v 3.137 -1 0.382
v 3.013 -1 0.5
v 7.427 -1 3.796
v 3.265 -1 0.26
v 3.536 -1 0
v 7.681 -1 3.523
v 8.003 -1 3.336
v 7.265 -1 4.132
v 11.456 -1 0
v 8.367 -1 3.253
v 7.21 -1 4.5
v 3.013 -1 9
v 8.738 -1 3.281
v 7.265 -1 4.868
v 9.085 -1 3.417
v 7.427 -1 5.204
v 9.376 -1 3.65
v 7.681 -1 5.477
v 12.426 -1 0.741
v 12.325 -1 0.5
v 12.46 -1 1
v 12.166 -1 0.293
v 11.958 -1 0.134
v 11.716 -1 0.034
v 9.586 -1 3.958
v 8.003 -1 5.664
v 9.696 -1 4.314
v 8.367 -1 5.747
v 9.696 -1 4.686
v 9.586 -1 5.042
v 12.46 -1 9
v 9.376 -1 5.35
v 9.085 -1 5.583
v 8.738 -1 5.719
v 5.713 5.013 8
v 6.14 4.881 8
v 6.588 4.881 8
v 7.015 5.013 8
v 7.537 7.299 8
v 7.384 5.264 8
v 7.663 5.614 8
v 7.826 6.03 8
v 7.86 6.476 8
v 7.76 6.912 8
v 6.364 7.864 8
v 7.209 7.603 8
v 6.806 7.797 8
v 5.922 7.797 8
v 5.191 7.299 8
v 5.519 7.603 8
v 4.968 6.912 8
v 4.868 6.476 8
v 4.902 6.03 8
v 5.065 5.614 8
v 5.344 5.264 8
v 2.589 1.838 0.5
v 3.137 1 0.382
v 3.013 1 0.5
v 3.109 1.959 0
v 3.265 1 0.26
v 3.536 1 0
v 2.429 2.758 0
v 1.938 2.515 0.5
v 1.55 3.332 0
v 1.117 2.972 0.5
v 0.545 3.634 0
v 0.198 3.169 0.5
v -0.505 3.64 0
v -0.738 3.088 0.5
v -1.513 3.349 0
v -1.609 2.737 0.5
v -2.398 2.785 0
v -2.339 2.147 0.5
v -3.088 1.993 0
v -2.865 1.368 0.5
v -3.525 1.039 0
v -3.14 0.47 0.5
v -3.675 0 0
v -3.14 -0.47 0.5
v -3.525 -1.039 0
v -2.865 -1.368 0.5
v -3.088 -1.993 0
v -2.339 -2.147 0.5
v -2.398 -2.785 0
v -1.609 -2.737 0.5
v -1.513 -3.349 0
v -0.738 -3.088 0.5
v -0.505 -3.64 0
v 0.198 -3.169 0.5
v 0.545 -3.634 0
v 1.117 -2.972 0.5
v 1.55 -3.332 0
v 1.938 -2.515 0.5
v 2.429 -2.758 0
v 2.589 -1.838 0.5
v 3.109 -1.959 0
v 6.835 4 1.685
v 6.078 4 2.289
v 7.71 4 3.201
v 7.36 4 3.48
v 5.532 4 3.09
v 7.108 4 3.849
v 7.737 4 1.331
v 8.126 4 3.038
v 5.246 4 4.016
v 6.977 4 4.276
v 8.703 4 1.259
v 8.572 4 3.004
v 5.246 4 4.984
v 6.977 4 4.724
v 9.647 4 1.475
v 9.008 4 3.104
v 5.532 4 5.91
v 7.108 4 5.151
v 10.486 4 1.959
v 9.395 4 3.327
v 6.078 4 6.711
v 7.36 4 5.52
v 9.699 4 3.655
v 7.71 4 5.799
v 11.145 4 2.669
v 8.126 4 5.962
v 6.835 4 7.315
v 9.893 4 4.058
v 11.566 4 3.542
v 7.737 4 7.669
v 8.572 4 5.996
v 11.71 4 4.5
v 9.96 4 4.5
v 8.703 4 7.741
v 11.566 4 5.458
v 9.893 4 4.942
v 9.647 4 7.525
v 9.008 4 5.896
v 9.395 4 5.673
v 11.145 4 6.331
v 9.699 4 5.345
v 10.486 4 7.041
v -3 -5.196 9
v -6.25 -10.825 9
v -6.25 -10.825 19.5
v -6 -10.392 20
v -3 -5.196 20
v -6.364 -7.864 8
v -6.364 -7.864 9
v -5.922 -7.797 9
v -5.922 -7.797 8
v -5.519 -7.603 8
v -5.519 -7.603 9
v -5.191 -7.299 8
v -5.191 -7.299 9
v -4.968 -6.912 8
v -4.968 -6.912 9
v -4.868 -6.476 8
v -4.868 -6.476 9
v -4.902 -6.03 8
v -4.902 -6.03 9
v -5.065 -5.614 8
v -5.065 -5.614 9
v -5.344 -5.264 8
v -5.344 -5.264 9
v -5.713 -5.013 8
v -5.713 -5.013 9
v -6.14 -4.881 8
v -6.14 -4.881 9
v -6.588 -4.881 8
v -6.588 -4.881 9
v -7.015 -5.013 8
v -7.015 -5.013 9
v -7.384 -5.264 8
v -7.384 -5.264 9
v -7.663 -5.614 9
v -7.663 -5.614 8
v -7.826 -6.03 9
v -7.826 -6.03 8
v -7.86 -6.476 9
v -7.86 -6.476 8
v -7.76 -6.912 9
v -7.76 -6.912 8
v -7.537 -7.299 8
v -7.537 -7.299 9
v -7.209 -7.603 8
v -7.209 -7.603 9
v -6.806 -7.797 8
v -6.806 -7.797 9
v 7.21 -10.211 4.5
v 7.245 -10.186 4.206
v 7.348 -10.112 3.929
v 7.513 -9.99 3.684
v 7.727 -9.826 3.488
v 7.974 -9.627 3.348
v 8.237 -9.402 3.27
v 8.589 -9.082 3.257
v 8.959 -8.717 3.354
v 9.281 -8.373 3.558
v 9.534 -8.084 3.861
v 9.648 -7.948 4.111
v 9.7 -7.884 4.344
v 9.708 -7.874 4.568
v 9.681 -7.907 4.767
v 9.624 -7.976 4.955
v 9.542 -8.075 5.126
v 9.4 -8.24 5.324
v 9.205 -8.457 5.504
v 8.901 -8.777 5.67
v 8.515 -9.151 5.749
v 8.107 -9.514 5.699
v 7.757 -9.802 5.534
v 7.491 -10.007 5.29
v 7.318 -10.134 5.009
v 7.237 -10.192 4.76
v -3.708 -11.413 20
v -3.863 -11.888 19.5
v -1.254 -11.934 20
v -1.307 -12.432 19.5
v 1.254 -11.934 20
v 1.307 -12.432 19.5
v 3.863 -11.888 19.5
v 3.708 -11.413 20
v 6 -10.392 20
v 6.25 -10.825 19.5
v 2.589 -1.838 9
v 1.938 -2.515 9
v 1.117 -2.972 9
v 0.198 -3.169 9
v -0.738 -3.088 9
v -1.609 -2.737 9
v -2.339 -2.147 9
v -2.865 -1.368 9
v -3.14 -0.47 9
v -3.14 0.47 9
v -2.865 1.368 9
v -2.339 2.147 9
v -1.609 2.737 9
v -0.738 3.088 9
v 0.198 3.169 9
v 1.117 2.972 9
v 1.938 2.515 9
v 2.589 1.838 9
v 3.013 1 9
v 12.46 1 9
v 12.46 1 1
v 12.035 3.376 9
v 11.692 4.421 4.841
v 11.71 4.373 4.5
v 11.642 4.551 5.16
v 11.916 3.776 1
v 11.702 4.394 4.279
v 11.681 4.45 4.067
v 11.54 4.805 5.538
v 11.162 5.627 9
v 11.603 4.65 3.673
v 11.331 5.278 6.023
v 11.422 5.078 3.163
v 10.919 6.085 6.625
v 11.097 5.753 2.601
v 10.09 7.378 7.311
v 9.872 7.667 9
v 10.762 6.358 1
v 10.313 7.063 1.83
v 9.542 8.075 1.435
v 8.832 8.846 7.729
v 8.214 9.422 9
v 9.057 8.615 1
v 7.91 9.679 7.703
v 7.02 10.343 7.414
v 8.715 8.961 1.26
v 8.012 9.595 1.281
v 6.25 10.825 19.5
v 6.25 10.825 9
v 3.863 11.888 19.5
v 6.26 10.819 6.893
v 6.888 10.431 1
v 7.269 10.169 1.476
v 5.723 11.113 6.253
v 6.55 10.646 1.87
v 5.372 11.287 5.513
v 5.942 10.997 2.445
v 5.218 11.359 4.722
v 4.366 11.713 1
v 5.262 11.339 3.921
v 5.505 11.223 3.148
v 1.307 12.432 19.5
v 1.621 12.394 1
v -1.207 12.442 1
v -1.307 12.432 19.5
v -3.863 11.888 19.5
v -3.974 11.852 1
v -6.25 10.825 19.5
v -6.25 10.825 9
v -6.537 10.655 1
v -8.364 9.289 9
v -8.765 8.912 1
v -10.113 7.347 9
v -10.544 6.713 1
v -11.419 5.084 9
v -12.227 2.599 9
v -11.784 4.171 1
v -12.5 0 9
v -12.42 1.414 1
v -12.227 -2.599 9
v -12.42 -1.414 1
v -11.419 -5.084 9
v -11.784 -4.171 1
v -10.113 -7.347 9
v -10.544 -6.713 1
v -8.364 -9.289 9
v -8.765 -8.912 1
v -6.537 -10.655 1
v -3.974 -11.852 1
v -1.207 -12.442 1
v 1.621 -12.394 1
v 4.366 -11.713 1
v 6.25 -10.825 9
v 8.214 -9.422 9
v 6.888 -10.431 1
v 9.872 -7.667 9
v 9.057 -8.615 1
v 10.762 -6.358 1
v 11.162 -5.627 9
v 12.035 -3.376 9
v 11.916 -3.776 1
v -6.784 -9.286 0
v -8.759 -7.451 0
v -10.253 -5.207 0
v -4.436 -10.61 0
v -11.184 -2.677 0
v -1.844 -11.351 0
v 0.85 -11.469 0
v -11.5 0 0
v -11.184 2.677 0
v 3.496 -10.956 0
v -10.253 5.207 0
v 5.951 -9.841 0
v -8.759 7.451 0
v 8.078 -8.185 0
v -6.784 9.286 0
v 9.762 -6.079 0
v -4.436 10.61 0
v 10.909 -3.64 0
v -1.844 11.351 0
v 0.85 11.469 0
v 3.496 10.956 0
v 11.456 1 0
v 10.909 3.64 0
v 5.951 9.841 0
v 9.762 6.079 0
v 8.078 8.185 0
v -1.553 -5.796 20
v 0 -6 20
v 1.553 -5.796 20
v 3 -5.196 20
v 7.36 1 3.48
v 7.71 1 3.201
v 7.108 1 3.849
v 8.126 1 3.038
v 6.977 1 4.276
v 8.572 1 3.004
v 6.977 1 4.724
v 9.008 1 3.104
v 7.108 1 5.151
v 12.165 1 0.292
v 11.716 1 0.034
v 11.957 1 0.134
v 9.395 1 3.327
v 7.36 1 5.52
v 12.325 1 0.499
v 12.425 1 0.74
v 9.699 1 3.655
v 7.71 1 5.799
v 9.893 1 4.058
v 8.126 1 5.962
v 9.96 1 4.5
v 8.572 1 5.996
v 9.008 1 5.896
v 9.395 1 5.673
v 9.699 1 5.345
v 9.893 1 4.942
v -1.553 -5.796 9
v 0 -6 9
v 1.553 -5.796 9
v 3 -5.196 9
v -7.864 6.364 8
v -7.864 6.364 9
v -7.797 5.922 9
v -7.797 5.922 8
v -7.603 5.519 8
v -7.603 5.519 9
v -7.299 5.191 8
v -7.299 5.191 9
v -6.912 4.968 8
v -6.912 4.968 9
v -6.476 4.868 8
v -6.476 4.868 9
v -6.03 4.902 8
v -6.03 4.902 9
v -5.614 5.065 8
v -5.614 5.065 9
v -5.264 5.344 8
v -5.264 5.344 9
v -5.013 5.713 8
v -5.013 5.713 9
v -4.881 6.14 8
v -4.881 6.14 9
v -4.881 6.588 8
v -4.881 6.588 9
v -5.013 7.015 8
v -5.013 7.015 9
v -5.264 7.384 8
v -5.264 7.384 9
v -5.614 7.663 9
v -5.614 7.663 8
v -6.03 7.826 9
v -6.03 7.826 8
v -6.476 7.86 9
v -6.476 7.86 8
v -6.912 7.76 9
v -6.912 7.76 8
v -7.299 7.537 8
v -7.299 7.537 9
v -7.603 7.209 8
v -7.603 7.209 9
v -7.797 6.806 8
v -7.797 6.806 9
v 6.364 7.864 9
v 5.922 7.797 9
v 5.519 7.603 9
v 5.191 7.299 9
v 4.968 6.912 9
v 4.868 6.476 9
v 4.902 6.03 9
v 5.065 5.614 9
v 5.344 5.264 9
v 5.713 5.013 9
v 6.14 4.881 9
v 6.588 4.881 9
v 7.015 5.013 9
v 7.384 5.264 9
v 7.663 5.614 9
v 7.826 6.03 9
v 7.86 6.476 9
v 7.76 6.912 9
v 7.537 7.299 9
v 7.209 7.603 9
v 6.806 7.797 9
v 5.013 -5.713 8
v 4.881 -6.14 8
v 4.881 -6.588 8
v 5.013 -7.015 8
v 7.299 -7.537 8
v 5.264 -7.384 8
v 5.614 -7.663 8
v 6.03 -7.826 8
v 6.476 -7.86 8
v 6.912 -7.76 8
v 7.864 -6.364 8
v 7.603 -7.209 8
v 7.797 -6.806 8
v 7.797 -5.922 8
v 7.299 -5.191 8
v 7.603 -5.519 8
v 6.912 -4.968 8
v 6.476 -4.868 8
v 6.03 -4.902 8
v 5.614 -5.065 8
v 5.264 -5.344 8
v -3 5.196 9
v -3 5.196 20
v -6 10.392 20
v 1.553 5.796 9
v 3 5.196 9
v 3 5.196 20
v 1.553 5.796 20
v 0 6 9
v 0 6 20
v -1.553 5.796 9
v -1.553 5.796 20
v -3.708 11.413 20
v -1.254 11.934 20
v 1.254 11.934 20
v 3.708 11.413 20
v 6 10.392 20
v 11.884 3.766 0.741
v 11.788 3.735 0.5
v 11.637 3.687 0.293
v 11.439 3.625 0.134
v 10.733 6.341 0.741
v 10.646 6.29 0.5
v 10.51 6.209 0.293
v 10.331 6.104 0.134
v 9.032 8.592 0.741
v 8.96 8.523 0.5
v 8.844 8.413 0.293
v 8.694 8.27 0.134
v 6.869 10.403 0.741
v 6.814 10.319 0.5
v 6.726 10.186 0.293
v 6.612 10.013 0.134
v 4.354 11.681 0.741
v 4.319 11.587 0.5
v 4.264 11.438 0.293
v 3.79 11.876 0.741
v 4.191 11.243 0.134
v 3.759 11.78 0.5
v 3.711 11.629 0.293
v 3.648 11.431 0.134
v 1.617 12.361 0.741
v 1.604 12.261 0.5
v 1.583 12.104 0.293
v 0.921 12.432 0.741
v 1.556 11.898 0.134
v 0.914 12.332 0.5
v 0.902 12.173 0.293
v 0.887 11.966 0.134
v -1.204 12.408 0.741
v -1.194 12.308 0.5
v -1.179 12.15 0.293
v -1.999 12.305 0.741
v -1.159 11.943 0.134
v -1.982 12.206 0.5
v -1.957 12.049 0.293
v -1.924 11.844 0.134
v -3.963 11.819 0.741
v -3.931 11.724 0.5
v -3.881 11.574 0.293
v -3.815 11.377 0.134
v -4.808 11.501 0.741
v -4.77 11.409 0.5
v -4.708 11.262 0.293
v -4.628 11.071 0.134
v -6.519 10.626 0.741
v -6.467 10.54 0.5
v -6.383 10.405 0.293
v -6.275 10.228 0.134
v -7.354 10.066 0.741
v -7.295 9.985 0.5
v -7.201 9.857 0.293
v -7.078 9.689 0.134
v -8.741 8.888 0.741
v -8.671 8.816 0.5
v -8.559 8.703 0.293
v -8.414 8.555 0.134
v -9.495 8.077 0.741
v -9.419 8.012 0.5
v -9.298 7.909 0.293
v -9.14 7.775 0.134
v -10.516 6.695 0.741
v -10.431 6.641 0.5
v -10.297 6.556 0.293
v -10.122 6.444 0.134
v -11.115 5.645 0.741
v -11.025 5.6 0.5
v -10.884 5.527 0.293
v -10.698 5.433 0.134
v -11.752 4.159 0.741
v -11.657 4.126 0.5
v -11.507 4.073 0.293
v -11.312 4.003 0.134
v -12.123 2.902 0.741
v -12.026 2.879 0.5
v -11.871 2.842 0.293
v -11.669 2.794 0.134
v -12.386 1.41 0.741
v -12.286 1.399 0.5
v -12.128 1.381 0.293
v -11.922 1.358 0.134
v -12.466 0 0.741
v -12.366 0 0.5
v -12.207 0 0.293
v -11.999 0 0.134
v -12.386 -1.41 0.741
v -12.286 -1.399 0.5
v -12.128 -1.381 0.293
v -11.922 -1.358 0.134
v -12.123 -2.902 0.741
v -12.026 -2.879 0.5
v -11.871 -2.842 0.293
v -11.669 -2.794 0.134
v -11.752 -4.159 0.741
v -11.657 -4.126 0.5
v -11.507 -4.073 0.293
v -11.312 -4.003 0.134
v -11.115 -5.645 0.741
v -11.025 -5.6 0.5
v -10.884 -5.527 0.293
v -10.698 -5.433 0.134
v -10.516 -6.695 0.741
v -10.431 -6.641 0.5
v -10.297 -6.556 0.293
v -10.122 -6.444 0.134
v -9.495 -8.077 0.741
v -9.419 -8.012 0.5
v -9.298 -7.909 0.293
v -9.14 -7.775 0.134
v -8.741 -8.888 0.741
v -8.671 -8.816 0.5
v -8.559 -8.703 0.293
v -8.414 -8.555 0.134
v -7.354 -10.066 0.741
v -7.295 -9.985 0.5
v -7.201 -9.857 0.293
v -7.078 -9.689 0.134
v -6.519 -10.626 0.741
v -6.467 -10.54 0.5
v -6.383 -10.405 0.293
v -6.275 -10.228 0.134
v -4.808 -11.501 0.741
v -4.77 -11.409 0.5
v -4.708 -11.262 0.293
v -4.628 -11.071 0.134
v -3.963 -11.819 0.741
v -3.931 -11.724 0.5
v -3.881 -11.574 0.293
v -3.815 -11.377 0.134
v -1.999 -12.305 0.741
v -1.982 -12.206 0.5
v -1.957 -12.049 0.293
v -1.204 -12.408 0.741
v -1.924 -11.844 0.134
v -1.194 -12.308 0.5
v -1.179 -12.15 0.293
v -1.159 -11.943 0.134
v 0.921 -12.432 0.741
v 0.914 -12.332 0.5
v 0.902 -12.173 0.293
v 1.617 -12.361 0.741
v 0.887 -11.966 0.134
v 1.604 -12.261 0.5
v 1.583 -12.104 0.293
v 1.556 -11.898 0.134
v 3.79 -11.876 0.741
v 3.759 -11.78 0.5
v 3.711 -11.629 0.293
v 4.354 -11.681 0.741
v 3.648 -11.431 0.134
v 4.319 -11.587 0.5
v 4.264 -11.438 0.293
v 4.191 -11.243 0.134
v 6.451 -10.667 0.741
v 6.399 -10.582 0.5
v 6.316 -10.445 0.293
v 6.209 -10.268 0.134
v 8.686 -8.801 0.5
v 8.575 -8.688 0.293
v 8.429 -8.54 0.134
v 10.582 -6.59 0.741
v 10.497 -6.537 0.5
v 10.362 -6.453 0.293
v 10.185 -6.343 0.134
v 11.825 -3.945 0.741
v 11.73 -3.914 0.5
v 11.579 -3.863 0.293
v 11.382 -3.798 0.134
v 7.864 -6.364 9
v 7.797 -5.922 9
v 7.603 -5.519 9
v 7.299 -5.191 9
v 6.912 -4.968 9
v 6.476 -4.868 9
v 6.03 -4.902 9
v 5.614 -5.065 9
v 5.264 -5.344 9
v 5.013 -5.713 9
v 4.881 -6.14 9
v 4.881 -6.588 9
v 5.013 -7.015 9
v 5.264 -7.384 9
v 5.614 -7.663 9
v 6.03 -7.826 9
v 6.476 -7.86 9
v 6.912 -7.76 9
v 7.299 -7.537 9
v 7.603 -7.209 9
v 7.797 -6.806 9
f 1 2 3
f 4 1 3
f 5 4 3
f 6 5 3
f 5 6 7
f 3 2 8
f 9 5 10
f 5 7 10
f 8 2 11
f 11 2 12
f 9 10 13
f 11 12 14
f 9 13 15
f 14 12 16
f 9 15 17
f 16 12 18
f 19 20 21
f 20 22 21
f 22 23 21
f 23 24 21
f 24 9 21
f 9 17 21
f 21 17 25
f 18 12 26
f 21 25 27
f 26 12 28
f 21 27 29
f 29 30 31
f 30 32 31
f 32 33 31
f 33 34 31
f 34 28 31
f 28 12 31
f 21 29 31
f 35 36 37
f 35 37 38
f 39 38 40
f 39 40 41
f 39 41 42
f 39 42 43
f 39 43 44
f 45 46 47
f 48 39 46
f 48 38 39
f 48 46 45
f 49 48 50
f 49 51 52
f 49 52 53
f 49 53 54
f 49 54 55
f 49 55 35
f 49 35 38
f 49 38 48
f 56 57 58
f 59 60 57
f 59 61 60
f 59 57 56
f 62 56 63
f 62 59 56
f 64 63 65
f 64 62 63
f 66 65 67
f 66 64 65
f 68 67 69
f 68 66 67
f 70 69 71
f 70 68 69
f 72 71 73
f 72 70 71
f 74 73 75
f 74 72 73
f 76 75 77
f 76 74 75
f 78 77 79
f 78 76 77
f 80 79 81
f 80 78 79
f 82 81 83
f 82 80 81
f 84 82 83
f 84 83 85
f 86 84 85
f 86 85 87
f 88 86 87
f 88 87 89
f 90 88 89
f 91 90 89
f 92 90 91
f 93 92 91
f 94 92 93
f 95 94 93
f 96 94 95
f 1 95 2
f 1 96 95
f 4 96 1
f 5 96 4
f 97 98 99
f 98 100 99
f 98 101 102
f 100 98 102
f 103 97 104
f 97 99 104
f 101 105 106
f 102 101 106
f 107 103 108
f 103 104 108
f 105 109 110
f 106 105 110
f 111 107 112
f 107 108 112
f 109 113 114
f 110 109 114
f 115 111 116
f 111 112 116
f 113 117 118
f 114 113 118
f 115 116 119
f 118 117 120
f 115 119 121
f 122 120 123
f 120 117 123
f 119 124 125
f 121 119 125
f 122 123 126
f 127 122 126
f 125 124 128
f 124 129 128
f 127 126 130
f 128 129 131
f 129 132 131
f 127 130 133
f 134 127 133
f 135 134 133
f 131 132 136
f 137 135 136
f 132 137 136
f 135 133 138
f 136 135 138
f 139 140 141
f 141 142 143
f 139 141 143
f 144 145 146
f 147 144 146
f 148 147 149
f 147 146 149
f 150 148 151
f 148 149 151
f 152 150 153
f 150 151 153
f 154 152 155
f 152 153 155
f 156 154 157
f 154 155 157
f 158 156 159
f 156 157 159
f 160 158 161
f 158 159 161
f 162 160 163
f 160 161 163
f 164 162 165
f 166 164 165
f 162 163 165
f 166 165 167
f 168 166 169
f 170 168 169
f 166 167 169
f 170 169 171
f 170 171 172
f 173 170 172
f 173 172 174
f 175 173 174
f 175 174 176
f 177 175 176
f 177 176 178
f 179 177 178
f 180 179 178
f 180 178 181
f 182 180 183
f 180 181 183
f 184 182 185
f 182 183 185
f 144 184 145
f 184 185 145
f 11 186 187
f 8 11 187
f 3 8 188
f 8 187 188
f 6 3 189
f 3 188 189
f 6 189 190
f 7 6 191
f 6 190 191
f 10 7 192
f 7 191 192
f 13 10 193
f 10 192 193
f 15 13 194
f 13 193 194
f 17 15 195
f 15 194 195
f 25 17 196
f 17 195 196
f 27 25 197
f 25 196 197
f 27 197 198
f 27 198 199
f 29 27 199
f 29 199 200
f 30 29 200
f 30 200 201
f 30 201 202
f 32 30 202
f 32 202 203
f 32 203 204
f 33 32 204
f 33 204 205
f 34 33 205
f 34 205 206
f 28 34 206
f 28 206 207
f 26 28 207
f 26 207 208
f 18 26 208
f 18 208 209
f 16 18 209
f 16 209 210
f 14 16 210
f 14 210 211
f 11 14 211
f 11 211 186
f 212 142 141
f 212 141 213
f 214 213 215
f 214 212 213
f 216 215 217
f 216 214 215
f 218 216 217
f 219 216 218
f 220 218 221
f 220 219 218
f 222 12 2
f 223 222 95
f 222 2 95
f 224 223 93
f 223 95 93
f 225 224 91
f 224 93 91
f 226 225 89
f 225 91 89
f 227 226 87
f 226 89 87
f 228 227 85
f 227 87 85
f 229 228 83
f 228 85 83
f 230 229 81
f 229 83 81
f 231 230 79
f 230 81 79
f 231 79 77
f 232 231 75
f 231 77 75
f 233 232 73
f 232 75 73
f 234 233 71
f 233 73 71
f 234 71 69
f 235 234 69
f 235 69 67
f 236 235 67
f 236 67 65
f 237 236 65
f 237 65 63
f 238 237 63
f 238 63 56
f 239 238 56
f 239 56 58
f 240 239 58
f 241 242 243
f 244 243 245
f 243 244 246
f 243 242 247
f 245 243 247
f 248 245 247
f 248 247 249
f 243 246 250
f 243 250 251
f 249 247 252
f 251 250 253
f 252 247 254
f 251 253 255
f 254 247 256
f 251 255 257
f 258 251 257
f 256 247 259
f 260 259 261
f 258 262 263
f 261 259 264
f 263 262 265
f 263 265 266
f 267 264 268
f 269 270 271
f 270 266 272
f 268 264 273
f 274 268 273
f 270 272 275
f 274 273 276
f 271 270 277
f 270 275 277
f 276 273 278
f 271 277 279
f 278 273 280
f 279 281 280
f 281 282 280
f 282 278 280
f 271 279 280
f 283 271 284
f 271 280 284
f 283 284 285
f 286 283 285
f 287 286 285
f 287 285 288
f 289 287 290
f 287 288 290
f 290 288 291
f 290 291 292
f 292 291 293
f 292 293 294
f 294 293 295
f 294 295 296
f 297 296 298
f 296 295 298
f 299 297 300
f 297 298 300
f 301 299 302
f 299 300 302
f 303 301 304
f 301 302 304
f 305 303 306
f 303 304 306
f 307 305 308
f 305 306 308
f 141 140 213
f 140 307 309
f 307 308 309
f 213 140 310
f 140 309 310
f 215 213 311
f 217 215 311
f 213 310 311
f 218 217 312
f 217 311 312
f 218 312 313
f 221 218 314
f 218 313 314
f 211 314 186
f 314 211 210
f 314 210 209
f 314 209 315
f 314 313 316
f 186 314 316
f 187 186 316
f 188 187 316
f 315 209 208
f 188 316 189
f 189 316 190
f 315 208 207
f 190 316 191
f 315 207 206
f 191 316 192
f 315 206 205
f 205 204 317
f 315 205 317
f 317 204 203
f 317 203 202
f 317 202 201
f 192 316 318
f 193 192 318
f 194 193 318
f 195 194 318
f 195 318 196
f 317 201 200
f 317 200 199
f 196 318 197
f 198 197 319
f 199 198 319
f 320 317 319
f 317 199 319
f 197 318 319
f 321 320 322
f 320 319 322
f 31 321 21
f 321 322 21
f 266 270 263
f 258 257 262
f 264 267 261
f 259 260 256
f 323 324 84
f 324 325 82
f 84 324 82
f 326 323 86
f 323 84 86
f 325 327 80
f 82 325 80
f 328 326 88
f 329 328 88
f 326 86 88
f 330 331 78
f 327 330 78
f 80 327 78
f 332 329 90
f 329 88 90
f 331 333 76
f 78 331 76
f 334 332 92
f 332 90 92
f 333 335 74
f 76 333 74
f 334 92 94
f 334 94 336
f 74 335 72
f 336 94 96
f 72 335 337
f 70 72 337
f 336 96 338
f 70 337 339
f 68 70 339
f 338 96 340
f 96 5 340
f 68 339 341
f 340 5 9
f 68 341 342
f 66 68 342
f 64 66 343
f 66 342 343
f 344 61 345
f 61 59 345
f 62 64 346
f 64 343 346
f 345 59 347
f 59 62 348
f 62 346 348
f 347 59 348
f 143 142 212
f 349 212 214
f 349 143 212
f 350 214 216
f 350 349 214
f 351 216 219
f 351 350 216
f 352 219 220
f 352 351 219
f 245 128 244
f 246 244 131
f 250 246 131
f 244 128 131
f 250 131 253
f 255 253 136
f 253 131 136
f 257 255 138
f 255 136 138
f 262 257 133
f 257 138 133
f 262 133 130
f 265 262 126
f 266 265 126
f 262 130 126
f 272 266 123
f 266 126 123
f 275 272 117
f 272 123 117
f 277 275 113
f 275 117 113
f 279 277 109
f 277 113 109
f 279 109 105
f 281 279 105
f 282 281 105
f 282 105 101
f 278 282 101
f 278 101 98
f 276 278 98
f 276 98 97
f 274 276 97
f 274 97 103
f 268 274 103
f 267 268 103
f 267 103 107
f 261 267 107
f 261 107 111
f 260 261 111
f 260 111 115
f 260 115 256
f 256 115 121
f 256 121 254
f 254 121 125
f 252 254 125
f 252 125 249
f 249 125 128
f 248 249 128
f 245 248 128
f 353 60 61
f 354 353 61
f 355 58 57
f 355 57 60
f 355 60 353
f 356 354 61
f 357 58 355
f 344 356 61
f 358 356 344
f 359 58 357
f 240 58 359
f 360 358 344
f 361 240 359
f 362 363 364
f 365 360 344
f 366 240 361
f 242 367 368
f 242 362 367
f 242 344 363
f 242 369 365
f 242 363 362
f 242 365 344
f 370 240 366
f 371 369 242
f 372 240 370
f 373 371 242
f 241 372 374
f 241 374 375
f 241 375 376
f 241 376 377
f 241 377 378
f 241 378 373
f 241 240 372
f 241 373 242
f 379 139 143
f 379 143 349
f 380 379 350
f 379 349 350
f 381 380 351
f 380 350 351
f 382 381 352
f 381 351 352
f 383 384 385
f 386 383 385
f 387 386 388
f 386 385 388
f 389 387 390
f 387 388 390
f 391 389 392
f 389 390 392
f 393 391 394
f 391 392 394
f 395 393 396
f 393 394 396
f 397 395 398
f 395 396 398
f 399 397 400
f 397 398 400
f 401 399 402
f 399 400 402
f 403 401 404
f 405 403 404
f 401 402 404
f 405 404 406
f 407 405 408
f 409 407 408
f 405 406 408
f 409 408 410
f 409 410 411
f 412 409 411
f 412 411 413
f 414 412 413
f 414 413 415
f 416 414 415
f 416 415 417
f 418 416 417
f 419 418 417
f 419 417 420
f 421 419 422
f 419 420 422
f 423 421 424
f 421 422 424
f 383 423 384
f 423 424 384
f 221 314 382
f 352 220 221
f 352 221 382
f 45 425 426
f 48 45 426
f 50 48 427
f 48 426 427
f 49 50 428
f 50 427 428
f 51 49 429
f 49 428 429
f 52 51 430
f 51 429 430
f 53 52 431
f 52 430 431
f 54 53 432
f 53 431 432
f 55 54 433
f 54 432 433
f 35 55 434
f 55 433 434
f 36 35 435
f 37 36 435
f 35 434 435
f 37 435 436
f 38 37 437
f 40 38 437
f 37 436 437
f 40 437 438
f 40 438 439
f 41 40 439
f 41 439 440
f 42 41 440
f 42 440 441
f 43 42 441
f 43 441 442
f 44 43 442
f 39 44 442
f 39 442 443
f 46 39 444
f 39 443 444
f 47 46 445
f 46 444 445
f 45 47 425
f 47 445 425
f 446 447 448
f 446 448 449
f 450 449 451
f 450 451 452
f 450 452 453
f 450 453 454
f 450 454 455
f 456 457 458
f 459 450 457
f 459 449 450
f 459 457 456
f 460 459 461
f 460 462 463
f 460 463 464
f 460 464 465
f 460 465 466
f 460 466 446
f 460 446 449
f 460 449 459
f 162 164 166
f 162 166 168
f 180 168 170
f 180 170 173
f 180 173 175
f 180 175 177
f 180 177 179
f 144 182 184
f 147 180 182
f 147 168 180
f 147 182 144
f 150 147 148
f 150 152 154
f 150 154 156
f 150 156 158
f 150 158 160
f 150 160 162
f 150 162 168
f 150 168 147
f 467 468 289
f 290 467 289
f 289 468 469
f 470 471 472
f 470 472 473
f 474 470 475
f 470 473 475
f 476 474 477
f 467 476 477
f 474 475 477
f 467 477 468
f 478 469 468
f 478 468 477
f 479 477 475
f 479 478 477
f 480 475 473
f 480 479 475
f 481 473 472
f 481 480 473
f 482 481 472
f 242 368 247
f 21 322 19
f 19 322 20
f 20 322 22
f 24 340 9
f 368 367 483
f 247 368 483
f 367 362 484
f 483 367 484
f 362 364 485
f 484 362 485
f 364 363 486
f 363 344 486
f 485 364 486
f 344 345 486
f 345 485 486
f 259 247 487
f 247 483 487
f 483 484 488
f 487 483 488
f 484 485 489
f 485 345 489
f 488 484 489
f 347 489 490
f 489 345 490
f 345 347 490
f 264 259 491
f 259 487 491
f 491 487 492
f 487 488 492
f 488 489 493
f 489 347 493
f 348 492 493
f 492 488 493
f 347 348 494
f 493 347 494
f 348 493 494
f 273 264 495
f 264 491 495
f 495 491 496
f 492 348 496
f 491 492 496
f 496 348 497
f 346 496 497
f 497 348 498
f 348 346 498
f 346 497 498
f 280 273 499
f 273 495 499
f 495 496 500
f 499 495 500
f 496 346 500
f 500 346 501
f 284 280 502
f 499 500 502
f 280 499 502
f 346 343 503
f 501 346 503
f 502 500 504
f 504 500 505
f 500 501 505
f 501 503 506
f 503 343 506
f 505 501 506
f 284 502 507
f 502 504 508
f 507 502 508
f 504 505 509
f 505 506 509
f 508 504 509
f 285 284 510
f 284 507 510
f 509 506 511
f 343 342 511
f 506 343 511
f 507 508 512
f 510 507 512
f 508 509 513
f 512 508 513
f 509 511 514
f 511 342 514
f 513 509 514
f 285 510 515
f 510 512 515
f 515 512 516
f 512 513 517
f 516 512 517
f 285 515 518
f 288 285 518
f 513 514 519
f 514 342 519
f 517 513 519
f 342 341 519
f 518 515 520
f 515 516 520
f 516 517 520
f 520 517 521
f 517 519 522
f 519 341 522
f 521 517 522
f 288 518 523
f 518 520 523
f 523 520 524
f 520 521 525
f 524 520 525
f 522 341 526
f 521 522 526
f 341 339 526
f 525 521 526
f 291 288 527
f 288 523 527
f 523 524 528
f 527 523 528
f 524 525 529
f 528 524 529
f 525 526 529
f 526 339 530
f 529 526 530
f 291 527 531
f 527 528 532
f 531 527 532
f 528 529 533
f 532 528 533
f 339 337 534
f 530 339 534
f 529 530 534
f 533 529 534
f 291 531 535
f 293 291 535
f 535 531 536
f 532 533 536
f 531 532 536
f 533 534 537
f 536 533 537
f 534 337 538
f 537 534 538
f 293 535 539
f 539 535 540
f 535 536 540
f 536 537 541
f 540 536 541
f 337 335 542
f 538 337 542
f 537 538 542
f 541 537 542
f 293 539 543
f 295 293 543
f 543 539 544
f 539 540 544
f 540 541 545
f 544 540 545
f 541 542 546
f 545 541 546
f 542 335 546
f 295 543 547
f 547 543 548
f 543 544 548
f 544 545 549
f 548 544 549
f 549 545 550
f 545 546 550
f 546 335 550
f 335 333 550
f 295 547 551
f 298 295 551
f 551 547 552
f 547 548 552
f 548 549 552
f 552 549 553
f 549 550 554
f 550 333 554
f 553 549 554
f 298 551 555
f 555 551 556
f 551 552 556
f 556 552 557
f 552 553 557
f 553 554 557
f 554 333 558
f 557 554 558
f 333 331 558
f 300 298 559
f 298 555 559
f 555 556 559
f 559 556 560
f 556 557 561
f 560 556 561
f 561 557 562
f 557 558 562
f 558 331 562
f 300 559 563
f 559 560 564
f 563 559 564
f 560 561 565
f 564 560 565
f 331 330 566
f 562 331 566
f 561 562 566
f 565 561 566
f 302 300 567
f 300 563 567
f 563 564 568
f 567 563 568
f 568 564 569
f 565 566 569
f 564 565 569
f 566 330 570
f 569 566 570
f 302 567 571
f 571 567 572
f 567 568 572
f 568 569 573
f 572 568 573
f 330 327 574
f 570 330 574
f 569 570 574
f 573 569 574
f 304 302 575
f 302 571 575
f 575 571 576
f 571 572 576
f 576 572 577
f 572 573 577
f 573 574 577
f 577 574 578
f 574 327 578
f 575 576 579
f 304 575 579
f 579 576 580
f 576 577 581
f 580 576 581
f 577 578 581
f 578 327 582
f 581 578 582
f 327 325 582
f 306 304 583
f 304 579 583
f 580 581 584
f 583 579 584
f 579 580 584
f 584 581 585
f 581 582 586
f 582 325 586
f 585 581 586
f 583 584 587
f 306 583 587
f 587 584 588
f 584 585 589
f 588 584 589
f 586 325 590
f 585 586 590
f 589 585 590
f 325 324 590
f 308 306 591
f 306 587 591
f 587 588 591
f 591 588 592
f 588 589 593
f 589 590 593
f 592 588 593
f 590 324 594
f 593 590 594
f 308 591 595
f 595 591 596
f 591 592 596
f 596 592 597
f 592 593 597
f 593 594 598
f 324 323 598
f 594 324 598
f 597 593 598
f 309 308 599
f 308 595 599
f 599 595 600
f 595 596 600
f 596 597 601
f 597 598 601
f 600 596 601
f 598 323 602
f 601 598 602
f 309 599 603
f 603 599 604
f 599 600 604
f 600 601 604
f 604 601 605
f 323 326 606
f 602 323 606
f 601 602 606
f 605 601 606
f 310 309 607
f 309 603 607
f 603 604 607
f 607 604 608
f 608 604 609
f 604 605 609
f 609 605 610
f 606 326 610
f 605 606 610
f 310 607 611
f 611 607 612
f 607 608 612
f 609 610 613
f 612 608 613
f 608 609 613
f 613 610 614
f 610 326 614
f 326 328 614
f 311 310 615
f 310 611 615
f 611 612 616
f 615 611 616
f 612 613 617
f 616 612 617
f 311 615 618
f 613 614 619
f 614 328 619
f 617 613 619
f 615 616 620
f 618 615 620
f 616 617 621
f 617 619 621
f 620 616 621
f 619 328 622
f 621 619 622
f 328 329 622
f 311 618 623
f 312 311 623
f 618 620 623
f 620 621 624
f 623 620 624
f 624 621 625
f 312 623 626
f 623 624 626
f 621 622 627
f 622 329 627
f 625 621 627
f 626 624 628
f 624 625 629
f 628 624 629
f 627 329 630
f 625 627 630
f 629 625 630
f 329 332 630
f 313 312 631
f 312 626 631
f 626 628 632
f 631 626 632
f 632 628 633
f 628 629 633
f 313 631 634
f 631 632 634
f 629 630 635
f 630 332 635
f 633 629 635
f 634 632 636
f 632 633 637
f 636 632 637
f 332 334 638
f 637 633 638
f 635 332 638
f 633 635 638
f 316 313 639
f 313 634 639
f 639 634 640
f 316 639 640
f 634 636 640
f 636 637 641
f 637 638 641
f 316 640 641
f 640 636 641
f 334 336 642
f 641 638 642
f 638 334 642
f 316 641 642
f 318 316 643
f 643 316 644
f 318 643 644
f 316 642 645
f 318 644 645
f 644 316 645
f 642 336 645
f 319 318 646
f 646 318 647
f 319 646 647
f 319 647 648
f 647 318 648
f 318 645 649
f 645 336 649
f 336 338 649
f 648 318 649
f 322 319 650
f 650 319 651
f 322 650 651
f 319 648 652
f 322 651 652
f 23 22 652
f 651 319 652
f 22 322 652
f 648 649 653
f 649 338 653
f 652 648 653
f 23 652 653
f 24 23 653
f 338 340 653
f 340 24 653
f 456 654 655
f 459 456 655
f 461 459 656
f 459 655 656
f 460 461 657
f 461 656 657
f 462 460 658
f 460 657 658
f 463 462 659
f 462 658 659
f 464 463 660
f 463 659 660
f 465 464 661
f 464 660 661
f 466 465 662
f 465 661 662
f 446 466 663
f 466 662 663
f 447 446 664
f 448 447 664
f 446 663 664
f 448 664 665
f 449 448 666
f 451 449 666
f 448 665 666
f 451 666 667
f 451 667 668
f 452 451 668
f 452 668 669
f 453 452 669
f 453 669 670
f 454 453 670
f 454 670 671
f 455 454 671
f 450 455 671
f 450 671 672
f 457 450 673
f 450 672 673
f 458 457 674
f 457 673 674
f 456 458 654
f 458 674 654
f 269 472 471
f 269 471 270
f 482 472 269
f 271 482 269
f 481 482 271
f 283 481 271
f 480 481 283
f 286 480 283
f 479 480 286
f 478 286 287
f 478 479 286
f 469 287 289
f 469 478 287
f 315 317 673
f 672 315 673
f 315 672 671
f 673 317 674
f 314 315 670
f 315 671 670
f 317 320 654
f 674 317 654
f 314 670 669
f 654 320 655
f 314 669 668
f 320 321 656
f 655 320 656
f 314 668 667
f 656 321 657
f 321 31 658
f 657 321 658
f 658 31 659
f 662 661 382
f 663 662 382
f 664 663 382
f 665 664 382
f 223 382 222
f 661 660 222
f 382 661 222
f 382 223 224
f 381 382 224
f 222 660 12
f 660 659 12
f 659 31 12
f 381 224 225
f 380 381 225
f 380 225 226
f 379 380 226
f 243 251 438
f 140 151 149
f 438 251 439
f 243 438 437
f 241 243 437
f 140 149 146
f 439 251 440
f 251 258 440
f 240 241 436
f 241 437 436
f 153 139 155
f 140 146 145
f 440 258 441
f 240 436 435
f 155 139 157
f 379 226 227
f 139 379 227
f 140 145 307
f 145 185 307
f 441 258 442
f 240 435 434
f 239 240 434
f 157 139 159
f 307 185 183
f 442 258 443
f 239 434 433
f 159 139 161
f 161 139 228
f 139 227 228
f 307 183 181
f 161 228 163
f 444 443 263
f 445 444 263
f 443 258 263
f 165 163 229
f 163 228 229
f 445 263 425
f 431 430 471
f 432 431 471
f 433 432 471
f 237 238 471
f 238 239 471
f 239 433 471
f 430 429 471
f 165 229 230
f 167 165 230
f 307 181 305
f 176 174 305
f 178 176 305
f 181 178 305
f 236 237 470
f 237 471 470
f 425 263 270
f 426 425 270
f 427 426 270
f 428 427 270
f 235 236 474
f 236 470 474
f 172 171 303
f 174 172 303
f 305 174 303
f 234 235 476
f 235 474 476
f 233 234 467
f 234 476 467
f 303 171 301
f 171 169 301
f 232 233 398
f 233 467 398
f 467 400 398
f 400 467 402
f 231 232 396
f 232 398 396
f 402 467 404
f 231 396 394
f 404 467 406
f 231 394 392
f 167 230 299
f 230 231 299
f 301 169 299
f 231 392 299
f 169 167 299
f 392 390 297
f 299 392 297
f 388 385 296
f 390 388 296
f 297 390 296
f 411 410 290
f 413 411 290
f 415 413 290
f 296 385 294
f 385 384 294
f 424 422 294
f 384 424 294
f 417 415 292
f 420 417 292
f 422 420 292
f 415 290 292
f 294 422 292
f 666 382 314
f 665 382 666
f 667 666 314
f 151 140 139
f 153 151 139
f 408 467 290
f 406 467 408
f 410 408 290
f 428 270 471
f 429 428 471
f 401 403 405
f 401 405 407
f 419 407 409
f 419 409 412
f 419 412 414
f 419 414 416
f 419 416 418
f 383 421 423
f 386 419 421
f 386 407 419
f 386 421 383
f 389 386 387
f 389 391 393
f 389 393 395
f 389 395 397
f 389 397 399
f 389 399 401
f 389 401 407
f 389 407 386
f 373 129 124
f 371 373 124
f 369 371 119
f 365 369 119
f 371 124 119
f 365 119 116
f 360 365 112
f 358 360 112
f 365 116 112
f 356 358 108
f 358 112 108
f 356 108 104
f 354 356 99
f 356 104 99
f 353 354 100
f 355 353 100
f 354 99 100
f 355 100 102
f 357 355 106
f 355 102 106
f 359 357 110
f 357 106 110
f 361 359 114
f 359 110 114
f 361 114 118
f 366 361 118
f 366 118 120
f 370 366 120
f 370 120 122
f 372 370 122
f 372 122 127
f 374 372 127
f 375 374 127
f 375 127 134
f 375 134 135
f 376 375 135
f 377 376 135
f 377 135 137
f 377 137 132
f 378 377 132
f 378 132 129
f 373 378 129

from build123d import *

# Parameters (mm, degrees)
ESBO_O1_R                 = 12.5
RESSALTO_EXTRUS_O1_DEPTH  = 20
CORTE_EXTRUS_O3_DEPTH     = 11
ESBO_O3_R                 = 3.175
CORTE_EXTRUS_O4_DEPTH     = 21
ESBO_O6_W                 = 12
ESBO_O6_H                 = 2
CORTE_EXTRUS_O5_DEPTH     = 10
CORTE_EXTRUS_O6_START     = -3
ESBO_O7_R                 = 3.25
CORTE_EXTRUS_O6_DEPTH     = 9.5
FURO_ROSCADO_DE_M3X0_51_D = 2.5
FILETE1_R                 = 1
ESBO_O10_R                = 1.5
CORTE_EXTRUS_O7_DEPTH     = 1
CHANFRO1_SIZE             = 0.5
CORTE_EXTRUS_O8_REACH     = 18.5
ESBO_O11_R                = 1.5
ESBO_O12_R                = 6
CORTE_EXTRUS_O9_DEPTH     = 11
PADR_OCIRCULAR1_COUNT     = 4
CHANFRO2_SIZE             = 0.5


with BuildPart() as part:
    # Esboço1 → Ressalto-extrusão1 (new body)
    with BuildSketch(Plane.XY):
        Circle(ESBO_O1_R)
    extrude(amount=RESSALTO_EXTRUS_O1_DEPTH)

    # Esboço2 → Corte-extrusão3 (cut)
    with BuildSketch(Plane.XY.offset(20)):
        with BuildLine():
            Line((0, 0), (6.25, 10.825317547))
            ThreePointArc((6.25, 10.825317547), (12.5, 0), (6.25, -10.825317547))
            Line((6.25, -10.825317547), (0, 0))
        make_face()
    corte_extrus_o3 = extrude(amount=-CORTE_EXTRUS_O3_DEPTH, mode=Mode.SUBTRACT)

    # Esboço3 → Corte-extrusão4 (cut, through all)
    with BuildSketch(Plane(origin=(0, 0, 0), x_dir=(-1, 0, 0), z_dir=(0, 0, -1))):
        Circle(ESBO_O3_R)
    extrude(amount=-CORTE_EXTRUS_O4_DEPTH, mode=Mode.SUBTRACT)

    # Espelhar1: Corte-extrusão3 across plane
    add(corte_extrus_o3.mirror(Plane(origin=(0, 0, 0), x_dir=(0, 0, 1), z_dir=(1, 0, 0))), mode=Mode.SUBTRACT)

    # Esboço6 → Corte-extrusão5 (cut, through all)
    with BuildSketch(Plane.XY.offset(9)):
        with Locations((7, 0)):
            Rectangle(ESBO_O6_W, ESBO_O6_H)
    extrude(amount=-CORTE_EXTRUS_O5_DEPTH, mode=Mode.SUBTRACT)

    # Esboço7 → Corte-extrusão6 (cut, through all)
    with BuildSketch(Plane.XZ.offset(-1).offset(CORTE_EXTRUS_O6_START)):
        with Locations((8.459935794, 4.5)):
            Circle(ESBO_O7_R)
    extrude(amount=-CORTE_EXTRUS_O6_DEPTH, mode=Mode.SUBTRACT)

    # Furo roscado de M3x0.51 (through all)
    with Locations(Plane(origin=(0, 4, 0), x_dir=(1, 0, 0), z_dir=(0, 1, 0))):
        with Locations((8.459935794, -4.5)):
            Hole(FURO_ROSCADO_DE_M3X0_51_D / 2)

    # Filete1
    filete1_edges = [part.edges().sort_by_distance(p)[0] for p in [
        (-12.5, 0, 0),
    ]]
    fillet(filete1_edges, radius=FILETE1_R)

    # Esboço10 → Corte-extrusão7 (cut)
    with BuildSketch(Plane.XY.offset(9)):
        with Locations((6.363961031, -6.363961031)):
            Circle(ESBO_O10_R)
    corte_extrus_o7 = extrude(amount=-CORTE_EXTRUS_O7_DEPTH, mode=Mode.SUBTRACT)

    # Chanfro1
    chanfro1_edges = [part.edges().sort_by_distance(p)[0] for p in [
        (0, -12.5, 20),
        (0, 12.5, 20),
    ]]
    chamfer(chanfro1_edges, length=CHANFRO1_SIZE)

    # Esboço11 → Corte-extrusão8 (cut, up to next)
    with BuildSketch(Plane(origin=(0, 4, 0), x_dir=(1, 0, 0), z_dir=(0, 1, 0)), mode=Mode.PRIVATE) as corte_extrus_o8_sk1:
        with Locations((8.459935794, -4.5)):
            Circle(ESBO_O11_R)
    corte_extrus_o8_tool1 = extrude(corte_extrus_o8_sk1.sketch, amount=-CORTE_EXTRUS_O8_REACH, mode=Mode.PRIVATE) & part.part
    add(corte_extrus_o8_tool1.solids().sort_by_distance((8.459936, 4, 4.5))[0], mode=Mode.SUBTRACT)

    # Esboço12 → Corte-extrusão9 (cut)
    with BuildSketch(Plane.XY.offset(20)):
        Circle(ESBO_O12_R)
    extrude(amount=-CORTE_EXTRUS_O9_DEPTH, mode=Mode.SUBTRACT)

    # PadrãoCircular1: Corte-extrusão7 ×4 about axis
    padr_ocircular1_axis = Axis((0, 0, 0), (0, 0, 1))
    for i in range(1, PADR_OCIRCULAR1_COUNT):
        add(corte_extrus_o7.rotate(padr_ocircular1_axis, i * 360 / PADR_OCIRCULAR1_COUNT), mode=Mode.SUBTRACT)

    # Chanfro2
    chanfro2_edges = [part.edges().sort_by_distance(p)[0] for p in [
        (-3.175, 0, 0),
    ]]
    chamfer(chanfro2_edges, length=CHANFRO2_SIZE)


solid = part.part
